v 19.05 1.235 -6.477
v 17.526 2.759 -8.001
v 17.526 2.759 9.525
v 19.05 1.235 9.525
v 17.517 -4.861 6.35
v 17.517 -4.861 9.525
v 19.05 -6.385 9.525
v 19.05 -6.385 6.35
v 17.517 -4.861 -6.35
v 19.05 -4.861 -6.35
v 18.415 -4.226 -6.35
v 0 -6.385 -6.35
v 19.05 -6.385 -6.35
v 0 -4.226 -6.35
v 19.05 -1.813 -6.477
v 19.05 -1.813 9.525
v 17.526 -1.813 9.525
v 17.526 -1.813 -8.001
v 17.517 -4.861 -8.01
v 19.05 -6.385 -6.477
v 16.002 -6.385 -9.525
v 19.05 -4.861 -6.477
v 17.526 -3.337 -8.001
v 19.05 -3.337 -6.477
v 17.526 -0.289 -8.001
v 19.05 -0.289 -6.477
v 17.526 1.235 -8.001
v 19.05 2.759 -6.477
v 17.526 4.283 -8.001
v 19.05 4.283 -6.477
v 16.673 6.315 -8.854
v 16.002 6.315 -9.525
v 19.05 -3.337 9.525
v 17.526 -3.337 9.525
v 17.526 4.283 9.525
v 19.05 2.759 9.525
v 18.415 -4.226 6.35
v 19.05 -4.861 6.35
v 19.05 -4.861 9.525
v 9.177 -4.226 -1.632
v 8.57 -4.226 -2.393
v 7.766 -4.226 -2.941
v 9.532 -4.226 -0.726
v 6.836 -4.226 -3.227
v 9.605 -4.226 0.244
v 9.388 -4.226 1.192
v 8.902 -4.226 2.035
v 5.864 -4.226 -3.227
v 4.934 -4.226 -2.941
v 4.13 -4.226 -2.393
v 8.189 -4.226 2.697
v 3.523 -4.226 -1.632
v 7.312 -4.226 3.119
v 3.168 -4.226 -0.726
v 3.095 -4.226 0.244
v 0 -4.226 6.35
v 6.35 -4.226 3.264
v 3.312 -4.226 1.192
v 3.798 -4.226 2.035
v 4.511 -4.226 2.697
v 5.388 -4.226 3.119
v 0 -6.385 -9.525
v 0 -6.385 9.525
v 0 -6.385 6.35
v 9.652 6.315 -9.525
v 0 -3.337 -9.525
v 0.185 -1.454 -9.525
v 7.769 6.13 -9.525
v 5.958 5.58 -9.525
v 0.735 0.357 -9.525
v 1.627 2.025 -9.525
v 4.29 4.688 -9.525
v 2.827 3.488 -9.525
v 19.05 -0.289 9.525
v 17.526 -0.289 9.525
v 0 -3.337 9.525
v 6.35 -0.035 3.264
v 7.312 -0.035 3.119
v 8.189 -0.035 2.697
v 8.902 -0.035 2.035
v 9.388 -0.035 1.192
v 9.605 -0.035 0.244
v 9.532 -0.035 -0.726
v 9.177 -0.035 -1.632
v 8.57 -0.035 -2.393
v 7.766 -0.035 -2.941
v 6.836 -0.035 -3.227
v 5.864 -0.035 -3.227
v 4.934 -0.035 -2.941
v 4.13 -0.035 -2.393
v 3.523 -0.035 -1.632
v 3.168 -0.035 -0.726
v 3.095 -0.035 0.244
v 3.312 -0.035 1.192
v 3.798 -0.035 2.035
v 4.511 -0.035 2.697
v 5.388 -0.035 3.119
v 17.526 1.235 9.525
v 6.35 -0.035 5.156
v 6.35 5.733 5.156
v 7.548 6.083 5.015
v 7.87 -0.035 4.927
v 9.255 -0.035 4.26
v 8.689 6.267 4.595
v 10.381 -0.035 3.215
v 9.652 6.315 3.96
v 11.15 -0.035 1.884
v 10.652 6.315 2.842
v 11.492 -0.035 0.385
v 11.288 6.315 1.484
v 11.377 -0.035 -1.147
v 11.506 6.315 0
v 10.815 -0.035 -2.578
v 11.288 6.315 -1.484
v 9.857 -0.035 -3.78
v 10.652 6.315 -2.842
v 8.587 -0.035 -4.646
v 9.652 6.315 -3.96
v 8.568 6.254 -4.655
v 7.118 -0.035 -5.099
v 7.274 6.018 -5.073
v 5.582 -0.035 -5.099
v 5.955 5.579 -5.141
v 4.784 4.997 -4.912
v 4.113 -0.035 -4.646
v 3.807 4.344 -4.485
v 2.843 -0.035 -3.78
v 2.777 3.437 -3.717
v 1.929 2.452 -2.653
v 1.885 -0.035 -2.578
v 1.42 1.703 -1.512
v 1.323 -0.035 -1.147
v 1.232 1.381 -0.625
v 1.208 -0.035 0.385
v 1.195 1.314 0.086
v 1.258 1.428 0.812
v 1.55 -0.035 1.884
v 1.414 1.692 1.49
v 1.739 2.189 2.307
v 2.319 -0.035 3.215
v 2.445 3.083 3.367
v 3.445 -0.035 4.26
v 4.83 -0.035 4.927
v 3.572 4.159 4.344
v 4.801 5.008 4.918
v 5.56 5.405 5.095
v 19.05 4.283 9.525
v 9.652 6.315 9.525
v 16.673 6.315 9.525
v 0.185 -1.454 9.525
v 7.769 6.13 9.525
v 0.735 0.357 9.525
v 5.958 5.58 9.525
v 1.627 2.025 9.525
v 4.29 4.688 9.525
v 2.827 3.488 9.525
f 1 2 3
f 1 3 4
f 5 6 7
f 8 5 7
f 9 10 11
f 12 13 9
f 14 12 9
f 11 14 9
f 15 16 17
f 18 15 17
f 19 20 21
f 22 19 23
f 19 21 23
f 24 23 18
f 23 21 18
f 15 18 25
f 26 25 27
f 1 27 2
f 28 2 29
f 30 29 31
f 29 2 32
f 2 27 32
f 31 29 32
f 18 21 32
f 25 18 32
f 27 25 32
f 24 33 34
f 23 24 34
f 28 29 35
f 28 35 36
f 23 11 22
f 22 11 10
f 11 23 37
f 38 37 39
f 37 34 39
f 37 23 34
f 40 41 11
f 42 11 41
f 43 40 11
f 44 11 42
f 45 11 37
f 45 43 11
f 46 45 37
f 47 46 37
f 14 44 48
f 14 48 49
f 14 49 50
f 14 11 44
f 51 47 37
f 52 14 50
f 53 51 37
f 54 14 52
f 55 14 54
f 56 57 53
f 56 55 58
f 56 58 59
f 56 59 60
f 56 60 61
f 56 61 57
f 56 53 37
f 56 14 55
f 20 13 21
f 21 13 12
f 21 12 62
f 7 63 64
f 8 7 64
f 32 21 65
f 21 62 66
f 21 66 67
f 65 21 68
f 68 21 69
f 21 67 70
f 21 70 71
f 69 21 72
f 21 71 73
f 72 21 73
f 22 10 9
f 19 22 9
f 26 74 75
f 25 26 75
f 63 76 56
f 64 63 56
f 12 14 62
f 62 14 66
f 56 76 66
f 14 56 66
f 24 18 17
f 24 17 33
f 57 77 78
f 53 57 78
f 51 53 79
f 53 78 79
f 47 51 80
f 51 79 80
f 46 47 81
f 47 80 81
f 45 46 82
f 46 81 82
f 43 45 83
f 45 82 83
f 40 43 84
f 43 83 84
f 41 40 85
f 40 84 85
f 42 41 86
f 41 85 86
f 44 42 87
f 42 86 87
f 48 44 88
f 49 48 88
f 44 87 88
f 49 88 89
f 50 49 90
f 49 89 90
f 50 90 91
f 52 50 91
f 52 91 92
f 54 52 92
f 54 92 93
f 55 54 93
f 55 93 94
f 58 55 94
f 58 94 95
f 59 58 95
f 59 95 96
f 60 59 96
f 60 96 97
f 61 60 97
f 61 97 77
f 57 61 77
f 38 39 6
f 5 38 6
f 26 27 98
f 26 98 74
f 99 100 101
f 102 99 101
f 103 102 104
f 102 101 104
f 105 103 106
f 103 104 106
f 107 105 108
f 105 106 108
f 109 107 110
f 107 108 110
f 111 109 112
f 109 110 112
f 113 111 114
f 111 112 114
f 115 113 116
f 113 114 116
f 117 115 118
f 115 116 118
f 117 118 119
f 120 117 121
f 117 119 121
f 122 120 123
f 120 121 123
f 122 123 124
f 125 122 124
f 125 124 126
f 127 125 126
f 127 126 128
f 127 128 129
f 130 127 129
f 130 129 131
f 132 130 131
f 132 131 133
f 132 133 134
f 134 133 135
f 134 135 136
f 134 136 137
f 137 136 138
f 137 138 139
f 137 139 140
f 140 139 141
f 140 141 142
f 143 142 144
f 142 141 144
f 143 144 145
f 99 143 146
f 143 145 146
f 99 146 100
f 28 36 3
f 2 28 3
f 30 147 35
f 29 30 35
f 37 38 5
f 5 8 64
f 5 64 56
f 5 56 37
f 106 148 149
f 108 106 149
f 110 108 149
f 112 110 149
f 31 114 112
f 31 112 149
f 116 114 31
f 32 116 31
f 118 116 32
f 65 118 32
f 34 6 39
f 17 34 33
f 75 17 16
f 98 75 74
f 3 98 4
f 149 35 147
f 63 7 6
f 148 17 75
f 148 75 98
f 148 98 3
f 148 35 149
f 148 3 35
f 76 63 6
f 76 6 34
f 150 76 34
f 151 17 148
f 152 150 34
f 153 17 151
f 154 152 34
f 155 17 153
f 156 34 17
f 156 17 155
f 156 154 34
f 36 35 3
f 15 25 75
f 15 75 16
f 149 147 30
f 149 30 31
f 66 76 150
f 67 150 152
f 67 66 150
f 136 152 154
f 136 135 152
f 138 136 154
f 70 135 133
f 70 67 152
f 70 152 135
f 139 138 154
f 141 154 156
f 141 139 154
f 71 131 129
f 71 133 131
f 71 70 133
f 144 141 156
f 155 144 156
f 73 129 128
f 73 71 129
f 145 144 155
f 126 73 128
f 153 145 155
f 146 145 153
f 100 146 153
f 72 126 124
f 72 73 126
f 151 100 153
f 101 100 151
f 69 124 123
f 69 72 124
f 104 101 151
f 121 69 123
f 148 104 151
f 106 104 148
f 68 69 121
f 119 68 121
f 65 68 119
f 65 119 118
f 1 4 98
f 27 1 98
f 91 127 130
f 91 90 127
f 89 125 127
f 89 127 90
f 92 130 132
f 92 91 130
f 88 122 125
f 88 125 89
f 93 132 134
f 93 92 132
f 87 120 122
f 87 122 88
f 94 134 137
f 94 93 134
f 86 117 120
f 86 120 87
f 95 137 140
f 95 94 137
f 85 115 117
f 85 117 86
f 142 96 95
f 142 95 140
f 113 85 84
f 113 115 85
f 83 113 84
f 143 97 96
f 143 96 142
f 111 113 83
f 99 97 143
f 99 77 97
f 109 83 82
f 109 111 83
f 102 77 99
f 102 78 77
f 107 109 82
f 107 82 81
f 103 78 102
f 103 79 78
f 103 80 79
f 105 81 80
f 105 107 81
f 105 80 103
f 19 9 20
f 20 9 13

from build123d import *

# Parameters (mm, degrees)
CROQUIS1_W              = 19.05
CROQUIS1_H              = 12.7
SALIENTE_EXTRUIR1_DEPTH = 19.05
CROQUIS2_W              = 12.7
CROQUIS2_H              = 2.159
CORTAR_EXTRUIR1_DEPTH   = 23.235007389
CHAFL_N1_SIZE           = 3.048
CROQUIS9_R              = 5.1562
CORTAR_EXTRUIR4_DEPTH   = 6.35
CROQUIS17_R             = 3.2639
CORTAR_EXTRUIR5_DEPTH   = 25.797542721
REDONDEO1_START         = -9.525
REDONDEO1_DEPTH         = 19.05
CORTAR_EXTRUIR6_DEPTH   = 28.687044486
CORTAR_EXTRUIR7_DEPTH   = 28.687044486
CORTAR_EXTRUIR8_DEPTH   = 28.687044486
CORTAR_EXTRUIR9_DEPTH   = 28.687044486
CORTAR_EXTRUIR10_DEPTH  = 28.687044486
CORTAR_EXTRUIR11_DEPTH  = 28.687044486
CORTAR_EXTRUIR12_DEPTH  = 28.687044486
CORTAR_EXTRUIR13_DEPTH  = 28.687044486


with BuildPart() as part:
    # Croquis1 → Saliente-Extruir1 (new body)
    with BuildSketch(Plane(origin=(0, 0, 0), x_dir=(0, 0, -1), z_dir=(1, 0, 0))):
        with Locations((0, -0.034937632)):
            Rectangle(CROQUIS1_W, CROQUIS1_H)
    extrude(amount=SALIENTE_EXTRUIR1_DEPTH)

    # Croquis2 → Cortar-Extruir1 (cut, through all)
    with BuildSketch(Plane.ZY):
        with Locations((0, -5.305437632)):
            Rectangle(CROQUIS2_W, CROQUIS2_H)
    extrude(amount=-CORTAR_EXTRUIR1_DEPTH, mode=Mode.SUBTRACT)

    # Chaflán1
    chafl_n1_edges = [part.edges().sort_by_distance(p)[0] for p in [
        (19.05, -0.034937632, -9.525),
    ]]
    chamfer(chafl_n1_edges, length=CHAFL_N1_SIZE)

    # Croquis9 → Cortar-Extruir4 (cut)
    with BuildSketch(Plane(origin=(0, 6.315062368, 0), x_dir=(1, 0, 0), z_dir=(0, 1, 0))):
        with Locations(Location((6.35, 0, 0), (0, 0, 270))):
            Circle(CROQUIS9_R)
    extrude(amount=-CORTAR_EXTRUIR4_DEPTH, mode=Mode.SUBTRACT)

    # Croquis17 → Cortar-Extruir5 (cut, through all)
    with BuildSketch(Plane(origin=(0, 6.315062368, 0), x_dir=(1, 0, 0), z_dir=(0, 1, 0))):
        with Locations(Location((6.35, 0, 0), (0, 0, 270))):
            Circle(CROQUIS17_R)
    extrude(amount=-CORTAR_EXTRUIR5_DEPTH, mode=Mode.SUBTRACT)

    # Redondeo1: read off the stored shape, not the designer's step
    # Redondeo1 outline → Redondeo1 (cut)
    with BuildSketch(Plane.XY.offset(REDONDEO1_START)):
        with BuildLine():
            ThreePointArc((0, -3.336937632), (2.827005348, 3.48805702), (9.652, 6.315062368))
            Line((9.652, 6.315062368), (0, 6.315062368))
            Line((0, 6.315062368), (0, -3.336937632))
        make_face()
    extrude(amount=REDONDEO1_DEPTH, mode=Mode.SUBTRACT)

    # Croquis20 → Cortar-Extruir6 (cut, through all)
    with BuildSketch(Plane.XY.offset(9.525)):
        Polygon((19.05, -6.384937632), (19.05, -4.860937632), (17.517257595, -4.860937632), align=None)
    extrude(amount=-CORTAR_EXTRUIR6_DEPTH, mode=Mode.SUBTRACT)

    # Croquis21 → Cortar-Extruir7 (cut, through all)
    with BuildSketch(Plane.XY.offset(9.525)):
        Polygon((19.05, -4.860937632), (19.05, -3.336937632), (17.526, -3.336937632), align=None)
    extrude(amount=-CORTAR_EXTRUIR7_DEPTH, mode=Mode.SUBTRACT)

    # Croquis22 → Cortar-Extruir8 (cut, through all)
    with BuildSketch(Plane.XY.offset(9.525)):
        Polygon((19.05, -3.336937632), (19.05, -1.812937632), (17.526, -1.812937632), align=None)
    extrude(amount=-CORTAR_EXTRUIR8_DEPTH, mode=Mode.SUBTRACT)

    # Croquis23 → Cortar-Extruir9 (cut, through all)
    with BuildSketch(Plane.XY.offset(9.525)):
        Polygon((19.05, -1.812937632), (19.05, -0.288937632), (17.526, -0.288937632), align=None)
    extrude(amount=-CORTAR_EXTRUIR9_DEPTH, mode=Mode.SUBTRACT)

    # Croquis24 → Cortar-Extruir10 (cut, through all)
    with BuildSketch(Plane.XY.offset(9.525)):
        Polygon((19.05, -0.288937632), (19.05, 1.235062368), (17.526, 1.235062368), align=None)
    extrude(amount=-CORTAR_EXTRUIR10_DEPTH, mode=Mode.SUBTRACT)

    # Croquis25 → Cortar-Extruir11 (cut, through all)
    with BuildSketch(Plane.XY.offset(9.525)):
        Polygon((19.05, 1.235062368), (19.05, 2.759062368), (17.526, 2.759062368), align=None)
    extrude(amount=-CORTAR_EXTRUIR11_DEPTH, mode=Mode.SUBTRACT)

    # Croquis26 → Cortar-Extruir12 (cut, through all)
    with BuildSketch(Plane.XY.offset(9.525)):
        Polygon((19.05, 2.759062368), (19.05, 4.283062368), (17.526, 4.283062368), align=None)
    extrude(amount=-CORTAR_EXTRUIR12_DEPTH, mode=Mode.SUBTRACT)

    # Croquis27 → Cortar-Extruir13 (cut, through all)
    with BuildSketch(Plane.XY.offset(9.525)):
        Polygon((19.05, 4.283062368), (16.672562903, 6.315062368), (19.05, 6.315062368), align=None)
    extrude(amount=-CORTAR_EXTRUIR13_DEPTH, mode=Mode.SUBTRACT)


solid = part.part
